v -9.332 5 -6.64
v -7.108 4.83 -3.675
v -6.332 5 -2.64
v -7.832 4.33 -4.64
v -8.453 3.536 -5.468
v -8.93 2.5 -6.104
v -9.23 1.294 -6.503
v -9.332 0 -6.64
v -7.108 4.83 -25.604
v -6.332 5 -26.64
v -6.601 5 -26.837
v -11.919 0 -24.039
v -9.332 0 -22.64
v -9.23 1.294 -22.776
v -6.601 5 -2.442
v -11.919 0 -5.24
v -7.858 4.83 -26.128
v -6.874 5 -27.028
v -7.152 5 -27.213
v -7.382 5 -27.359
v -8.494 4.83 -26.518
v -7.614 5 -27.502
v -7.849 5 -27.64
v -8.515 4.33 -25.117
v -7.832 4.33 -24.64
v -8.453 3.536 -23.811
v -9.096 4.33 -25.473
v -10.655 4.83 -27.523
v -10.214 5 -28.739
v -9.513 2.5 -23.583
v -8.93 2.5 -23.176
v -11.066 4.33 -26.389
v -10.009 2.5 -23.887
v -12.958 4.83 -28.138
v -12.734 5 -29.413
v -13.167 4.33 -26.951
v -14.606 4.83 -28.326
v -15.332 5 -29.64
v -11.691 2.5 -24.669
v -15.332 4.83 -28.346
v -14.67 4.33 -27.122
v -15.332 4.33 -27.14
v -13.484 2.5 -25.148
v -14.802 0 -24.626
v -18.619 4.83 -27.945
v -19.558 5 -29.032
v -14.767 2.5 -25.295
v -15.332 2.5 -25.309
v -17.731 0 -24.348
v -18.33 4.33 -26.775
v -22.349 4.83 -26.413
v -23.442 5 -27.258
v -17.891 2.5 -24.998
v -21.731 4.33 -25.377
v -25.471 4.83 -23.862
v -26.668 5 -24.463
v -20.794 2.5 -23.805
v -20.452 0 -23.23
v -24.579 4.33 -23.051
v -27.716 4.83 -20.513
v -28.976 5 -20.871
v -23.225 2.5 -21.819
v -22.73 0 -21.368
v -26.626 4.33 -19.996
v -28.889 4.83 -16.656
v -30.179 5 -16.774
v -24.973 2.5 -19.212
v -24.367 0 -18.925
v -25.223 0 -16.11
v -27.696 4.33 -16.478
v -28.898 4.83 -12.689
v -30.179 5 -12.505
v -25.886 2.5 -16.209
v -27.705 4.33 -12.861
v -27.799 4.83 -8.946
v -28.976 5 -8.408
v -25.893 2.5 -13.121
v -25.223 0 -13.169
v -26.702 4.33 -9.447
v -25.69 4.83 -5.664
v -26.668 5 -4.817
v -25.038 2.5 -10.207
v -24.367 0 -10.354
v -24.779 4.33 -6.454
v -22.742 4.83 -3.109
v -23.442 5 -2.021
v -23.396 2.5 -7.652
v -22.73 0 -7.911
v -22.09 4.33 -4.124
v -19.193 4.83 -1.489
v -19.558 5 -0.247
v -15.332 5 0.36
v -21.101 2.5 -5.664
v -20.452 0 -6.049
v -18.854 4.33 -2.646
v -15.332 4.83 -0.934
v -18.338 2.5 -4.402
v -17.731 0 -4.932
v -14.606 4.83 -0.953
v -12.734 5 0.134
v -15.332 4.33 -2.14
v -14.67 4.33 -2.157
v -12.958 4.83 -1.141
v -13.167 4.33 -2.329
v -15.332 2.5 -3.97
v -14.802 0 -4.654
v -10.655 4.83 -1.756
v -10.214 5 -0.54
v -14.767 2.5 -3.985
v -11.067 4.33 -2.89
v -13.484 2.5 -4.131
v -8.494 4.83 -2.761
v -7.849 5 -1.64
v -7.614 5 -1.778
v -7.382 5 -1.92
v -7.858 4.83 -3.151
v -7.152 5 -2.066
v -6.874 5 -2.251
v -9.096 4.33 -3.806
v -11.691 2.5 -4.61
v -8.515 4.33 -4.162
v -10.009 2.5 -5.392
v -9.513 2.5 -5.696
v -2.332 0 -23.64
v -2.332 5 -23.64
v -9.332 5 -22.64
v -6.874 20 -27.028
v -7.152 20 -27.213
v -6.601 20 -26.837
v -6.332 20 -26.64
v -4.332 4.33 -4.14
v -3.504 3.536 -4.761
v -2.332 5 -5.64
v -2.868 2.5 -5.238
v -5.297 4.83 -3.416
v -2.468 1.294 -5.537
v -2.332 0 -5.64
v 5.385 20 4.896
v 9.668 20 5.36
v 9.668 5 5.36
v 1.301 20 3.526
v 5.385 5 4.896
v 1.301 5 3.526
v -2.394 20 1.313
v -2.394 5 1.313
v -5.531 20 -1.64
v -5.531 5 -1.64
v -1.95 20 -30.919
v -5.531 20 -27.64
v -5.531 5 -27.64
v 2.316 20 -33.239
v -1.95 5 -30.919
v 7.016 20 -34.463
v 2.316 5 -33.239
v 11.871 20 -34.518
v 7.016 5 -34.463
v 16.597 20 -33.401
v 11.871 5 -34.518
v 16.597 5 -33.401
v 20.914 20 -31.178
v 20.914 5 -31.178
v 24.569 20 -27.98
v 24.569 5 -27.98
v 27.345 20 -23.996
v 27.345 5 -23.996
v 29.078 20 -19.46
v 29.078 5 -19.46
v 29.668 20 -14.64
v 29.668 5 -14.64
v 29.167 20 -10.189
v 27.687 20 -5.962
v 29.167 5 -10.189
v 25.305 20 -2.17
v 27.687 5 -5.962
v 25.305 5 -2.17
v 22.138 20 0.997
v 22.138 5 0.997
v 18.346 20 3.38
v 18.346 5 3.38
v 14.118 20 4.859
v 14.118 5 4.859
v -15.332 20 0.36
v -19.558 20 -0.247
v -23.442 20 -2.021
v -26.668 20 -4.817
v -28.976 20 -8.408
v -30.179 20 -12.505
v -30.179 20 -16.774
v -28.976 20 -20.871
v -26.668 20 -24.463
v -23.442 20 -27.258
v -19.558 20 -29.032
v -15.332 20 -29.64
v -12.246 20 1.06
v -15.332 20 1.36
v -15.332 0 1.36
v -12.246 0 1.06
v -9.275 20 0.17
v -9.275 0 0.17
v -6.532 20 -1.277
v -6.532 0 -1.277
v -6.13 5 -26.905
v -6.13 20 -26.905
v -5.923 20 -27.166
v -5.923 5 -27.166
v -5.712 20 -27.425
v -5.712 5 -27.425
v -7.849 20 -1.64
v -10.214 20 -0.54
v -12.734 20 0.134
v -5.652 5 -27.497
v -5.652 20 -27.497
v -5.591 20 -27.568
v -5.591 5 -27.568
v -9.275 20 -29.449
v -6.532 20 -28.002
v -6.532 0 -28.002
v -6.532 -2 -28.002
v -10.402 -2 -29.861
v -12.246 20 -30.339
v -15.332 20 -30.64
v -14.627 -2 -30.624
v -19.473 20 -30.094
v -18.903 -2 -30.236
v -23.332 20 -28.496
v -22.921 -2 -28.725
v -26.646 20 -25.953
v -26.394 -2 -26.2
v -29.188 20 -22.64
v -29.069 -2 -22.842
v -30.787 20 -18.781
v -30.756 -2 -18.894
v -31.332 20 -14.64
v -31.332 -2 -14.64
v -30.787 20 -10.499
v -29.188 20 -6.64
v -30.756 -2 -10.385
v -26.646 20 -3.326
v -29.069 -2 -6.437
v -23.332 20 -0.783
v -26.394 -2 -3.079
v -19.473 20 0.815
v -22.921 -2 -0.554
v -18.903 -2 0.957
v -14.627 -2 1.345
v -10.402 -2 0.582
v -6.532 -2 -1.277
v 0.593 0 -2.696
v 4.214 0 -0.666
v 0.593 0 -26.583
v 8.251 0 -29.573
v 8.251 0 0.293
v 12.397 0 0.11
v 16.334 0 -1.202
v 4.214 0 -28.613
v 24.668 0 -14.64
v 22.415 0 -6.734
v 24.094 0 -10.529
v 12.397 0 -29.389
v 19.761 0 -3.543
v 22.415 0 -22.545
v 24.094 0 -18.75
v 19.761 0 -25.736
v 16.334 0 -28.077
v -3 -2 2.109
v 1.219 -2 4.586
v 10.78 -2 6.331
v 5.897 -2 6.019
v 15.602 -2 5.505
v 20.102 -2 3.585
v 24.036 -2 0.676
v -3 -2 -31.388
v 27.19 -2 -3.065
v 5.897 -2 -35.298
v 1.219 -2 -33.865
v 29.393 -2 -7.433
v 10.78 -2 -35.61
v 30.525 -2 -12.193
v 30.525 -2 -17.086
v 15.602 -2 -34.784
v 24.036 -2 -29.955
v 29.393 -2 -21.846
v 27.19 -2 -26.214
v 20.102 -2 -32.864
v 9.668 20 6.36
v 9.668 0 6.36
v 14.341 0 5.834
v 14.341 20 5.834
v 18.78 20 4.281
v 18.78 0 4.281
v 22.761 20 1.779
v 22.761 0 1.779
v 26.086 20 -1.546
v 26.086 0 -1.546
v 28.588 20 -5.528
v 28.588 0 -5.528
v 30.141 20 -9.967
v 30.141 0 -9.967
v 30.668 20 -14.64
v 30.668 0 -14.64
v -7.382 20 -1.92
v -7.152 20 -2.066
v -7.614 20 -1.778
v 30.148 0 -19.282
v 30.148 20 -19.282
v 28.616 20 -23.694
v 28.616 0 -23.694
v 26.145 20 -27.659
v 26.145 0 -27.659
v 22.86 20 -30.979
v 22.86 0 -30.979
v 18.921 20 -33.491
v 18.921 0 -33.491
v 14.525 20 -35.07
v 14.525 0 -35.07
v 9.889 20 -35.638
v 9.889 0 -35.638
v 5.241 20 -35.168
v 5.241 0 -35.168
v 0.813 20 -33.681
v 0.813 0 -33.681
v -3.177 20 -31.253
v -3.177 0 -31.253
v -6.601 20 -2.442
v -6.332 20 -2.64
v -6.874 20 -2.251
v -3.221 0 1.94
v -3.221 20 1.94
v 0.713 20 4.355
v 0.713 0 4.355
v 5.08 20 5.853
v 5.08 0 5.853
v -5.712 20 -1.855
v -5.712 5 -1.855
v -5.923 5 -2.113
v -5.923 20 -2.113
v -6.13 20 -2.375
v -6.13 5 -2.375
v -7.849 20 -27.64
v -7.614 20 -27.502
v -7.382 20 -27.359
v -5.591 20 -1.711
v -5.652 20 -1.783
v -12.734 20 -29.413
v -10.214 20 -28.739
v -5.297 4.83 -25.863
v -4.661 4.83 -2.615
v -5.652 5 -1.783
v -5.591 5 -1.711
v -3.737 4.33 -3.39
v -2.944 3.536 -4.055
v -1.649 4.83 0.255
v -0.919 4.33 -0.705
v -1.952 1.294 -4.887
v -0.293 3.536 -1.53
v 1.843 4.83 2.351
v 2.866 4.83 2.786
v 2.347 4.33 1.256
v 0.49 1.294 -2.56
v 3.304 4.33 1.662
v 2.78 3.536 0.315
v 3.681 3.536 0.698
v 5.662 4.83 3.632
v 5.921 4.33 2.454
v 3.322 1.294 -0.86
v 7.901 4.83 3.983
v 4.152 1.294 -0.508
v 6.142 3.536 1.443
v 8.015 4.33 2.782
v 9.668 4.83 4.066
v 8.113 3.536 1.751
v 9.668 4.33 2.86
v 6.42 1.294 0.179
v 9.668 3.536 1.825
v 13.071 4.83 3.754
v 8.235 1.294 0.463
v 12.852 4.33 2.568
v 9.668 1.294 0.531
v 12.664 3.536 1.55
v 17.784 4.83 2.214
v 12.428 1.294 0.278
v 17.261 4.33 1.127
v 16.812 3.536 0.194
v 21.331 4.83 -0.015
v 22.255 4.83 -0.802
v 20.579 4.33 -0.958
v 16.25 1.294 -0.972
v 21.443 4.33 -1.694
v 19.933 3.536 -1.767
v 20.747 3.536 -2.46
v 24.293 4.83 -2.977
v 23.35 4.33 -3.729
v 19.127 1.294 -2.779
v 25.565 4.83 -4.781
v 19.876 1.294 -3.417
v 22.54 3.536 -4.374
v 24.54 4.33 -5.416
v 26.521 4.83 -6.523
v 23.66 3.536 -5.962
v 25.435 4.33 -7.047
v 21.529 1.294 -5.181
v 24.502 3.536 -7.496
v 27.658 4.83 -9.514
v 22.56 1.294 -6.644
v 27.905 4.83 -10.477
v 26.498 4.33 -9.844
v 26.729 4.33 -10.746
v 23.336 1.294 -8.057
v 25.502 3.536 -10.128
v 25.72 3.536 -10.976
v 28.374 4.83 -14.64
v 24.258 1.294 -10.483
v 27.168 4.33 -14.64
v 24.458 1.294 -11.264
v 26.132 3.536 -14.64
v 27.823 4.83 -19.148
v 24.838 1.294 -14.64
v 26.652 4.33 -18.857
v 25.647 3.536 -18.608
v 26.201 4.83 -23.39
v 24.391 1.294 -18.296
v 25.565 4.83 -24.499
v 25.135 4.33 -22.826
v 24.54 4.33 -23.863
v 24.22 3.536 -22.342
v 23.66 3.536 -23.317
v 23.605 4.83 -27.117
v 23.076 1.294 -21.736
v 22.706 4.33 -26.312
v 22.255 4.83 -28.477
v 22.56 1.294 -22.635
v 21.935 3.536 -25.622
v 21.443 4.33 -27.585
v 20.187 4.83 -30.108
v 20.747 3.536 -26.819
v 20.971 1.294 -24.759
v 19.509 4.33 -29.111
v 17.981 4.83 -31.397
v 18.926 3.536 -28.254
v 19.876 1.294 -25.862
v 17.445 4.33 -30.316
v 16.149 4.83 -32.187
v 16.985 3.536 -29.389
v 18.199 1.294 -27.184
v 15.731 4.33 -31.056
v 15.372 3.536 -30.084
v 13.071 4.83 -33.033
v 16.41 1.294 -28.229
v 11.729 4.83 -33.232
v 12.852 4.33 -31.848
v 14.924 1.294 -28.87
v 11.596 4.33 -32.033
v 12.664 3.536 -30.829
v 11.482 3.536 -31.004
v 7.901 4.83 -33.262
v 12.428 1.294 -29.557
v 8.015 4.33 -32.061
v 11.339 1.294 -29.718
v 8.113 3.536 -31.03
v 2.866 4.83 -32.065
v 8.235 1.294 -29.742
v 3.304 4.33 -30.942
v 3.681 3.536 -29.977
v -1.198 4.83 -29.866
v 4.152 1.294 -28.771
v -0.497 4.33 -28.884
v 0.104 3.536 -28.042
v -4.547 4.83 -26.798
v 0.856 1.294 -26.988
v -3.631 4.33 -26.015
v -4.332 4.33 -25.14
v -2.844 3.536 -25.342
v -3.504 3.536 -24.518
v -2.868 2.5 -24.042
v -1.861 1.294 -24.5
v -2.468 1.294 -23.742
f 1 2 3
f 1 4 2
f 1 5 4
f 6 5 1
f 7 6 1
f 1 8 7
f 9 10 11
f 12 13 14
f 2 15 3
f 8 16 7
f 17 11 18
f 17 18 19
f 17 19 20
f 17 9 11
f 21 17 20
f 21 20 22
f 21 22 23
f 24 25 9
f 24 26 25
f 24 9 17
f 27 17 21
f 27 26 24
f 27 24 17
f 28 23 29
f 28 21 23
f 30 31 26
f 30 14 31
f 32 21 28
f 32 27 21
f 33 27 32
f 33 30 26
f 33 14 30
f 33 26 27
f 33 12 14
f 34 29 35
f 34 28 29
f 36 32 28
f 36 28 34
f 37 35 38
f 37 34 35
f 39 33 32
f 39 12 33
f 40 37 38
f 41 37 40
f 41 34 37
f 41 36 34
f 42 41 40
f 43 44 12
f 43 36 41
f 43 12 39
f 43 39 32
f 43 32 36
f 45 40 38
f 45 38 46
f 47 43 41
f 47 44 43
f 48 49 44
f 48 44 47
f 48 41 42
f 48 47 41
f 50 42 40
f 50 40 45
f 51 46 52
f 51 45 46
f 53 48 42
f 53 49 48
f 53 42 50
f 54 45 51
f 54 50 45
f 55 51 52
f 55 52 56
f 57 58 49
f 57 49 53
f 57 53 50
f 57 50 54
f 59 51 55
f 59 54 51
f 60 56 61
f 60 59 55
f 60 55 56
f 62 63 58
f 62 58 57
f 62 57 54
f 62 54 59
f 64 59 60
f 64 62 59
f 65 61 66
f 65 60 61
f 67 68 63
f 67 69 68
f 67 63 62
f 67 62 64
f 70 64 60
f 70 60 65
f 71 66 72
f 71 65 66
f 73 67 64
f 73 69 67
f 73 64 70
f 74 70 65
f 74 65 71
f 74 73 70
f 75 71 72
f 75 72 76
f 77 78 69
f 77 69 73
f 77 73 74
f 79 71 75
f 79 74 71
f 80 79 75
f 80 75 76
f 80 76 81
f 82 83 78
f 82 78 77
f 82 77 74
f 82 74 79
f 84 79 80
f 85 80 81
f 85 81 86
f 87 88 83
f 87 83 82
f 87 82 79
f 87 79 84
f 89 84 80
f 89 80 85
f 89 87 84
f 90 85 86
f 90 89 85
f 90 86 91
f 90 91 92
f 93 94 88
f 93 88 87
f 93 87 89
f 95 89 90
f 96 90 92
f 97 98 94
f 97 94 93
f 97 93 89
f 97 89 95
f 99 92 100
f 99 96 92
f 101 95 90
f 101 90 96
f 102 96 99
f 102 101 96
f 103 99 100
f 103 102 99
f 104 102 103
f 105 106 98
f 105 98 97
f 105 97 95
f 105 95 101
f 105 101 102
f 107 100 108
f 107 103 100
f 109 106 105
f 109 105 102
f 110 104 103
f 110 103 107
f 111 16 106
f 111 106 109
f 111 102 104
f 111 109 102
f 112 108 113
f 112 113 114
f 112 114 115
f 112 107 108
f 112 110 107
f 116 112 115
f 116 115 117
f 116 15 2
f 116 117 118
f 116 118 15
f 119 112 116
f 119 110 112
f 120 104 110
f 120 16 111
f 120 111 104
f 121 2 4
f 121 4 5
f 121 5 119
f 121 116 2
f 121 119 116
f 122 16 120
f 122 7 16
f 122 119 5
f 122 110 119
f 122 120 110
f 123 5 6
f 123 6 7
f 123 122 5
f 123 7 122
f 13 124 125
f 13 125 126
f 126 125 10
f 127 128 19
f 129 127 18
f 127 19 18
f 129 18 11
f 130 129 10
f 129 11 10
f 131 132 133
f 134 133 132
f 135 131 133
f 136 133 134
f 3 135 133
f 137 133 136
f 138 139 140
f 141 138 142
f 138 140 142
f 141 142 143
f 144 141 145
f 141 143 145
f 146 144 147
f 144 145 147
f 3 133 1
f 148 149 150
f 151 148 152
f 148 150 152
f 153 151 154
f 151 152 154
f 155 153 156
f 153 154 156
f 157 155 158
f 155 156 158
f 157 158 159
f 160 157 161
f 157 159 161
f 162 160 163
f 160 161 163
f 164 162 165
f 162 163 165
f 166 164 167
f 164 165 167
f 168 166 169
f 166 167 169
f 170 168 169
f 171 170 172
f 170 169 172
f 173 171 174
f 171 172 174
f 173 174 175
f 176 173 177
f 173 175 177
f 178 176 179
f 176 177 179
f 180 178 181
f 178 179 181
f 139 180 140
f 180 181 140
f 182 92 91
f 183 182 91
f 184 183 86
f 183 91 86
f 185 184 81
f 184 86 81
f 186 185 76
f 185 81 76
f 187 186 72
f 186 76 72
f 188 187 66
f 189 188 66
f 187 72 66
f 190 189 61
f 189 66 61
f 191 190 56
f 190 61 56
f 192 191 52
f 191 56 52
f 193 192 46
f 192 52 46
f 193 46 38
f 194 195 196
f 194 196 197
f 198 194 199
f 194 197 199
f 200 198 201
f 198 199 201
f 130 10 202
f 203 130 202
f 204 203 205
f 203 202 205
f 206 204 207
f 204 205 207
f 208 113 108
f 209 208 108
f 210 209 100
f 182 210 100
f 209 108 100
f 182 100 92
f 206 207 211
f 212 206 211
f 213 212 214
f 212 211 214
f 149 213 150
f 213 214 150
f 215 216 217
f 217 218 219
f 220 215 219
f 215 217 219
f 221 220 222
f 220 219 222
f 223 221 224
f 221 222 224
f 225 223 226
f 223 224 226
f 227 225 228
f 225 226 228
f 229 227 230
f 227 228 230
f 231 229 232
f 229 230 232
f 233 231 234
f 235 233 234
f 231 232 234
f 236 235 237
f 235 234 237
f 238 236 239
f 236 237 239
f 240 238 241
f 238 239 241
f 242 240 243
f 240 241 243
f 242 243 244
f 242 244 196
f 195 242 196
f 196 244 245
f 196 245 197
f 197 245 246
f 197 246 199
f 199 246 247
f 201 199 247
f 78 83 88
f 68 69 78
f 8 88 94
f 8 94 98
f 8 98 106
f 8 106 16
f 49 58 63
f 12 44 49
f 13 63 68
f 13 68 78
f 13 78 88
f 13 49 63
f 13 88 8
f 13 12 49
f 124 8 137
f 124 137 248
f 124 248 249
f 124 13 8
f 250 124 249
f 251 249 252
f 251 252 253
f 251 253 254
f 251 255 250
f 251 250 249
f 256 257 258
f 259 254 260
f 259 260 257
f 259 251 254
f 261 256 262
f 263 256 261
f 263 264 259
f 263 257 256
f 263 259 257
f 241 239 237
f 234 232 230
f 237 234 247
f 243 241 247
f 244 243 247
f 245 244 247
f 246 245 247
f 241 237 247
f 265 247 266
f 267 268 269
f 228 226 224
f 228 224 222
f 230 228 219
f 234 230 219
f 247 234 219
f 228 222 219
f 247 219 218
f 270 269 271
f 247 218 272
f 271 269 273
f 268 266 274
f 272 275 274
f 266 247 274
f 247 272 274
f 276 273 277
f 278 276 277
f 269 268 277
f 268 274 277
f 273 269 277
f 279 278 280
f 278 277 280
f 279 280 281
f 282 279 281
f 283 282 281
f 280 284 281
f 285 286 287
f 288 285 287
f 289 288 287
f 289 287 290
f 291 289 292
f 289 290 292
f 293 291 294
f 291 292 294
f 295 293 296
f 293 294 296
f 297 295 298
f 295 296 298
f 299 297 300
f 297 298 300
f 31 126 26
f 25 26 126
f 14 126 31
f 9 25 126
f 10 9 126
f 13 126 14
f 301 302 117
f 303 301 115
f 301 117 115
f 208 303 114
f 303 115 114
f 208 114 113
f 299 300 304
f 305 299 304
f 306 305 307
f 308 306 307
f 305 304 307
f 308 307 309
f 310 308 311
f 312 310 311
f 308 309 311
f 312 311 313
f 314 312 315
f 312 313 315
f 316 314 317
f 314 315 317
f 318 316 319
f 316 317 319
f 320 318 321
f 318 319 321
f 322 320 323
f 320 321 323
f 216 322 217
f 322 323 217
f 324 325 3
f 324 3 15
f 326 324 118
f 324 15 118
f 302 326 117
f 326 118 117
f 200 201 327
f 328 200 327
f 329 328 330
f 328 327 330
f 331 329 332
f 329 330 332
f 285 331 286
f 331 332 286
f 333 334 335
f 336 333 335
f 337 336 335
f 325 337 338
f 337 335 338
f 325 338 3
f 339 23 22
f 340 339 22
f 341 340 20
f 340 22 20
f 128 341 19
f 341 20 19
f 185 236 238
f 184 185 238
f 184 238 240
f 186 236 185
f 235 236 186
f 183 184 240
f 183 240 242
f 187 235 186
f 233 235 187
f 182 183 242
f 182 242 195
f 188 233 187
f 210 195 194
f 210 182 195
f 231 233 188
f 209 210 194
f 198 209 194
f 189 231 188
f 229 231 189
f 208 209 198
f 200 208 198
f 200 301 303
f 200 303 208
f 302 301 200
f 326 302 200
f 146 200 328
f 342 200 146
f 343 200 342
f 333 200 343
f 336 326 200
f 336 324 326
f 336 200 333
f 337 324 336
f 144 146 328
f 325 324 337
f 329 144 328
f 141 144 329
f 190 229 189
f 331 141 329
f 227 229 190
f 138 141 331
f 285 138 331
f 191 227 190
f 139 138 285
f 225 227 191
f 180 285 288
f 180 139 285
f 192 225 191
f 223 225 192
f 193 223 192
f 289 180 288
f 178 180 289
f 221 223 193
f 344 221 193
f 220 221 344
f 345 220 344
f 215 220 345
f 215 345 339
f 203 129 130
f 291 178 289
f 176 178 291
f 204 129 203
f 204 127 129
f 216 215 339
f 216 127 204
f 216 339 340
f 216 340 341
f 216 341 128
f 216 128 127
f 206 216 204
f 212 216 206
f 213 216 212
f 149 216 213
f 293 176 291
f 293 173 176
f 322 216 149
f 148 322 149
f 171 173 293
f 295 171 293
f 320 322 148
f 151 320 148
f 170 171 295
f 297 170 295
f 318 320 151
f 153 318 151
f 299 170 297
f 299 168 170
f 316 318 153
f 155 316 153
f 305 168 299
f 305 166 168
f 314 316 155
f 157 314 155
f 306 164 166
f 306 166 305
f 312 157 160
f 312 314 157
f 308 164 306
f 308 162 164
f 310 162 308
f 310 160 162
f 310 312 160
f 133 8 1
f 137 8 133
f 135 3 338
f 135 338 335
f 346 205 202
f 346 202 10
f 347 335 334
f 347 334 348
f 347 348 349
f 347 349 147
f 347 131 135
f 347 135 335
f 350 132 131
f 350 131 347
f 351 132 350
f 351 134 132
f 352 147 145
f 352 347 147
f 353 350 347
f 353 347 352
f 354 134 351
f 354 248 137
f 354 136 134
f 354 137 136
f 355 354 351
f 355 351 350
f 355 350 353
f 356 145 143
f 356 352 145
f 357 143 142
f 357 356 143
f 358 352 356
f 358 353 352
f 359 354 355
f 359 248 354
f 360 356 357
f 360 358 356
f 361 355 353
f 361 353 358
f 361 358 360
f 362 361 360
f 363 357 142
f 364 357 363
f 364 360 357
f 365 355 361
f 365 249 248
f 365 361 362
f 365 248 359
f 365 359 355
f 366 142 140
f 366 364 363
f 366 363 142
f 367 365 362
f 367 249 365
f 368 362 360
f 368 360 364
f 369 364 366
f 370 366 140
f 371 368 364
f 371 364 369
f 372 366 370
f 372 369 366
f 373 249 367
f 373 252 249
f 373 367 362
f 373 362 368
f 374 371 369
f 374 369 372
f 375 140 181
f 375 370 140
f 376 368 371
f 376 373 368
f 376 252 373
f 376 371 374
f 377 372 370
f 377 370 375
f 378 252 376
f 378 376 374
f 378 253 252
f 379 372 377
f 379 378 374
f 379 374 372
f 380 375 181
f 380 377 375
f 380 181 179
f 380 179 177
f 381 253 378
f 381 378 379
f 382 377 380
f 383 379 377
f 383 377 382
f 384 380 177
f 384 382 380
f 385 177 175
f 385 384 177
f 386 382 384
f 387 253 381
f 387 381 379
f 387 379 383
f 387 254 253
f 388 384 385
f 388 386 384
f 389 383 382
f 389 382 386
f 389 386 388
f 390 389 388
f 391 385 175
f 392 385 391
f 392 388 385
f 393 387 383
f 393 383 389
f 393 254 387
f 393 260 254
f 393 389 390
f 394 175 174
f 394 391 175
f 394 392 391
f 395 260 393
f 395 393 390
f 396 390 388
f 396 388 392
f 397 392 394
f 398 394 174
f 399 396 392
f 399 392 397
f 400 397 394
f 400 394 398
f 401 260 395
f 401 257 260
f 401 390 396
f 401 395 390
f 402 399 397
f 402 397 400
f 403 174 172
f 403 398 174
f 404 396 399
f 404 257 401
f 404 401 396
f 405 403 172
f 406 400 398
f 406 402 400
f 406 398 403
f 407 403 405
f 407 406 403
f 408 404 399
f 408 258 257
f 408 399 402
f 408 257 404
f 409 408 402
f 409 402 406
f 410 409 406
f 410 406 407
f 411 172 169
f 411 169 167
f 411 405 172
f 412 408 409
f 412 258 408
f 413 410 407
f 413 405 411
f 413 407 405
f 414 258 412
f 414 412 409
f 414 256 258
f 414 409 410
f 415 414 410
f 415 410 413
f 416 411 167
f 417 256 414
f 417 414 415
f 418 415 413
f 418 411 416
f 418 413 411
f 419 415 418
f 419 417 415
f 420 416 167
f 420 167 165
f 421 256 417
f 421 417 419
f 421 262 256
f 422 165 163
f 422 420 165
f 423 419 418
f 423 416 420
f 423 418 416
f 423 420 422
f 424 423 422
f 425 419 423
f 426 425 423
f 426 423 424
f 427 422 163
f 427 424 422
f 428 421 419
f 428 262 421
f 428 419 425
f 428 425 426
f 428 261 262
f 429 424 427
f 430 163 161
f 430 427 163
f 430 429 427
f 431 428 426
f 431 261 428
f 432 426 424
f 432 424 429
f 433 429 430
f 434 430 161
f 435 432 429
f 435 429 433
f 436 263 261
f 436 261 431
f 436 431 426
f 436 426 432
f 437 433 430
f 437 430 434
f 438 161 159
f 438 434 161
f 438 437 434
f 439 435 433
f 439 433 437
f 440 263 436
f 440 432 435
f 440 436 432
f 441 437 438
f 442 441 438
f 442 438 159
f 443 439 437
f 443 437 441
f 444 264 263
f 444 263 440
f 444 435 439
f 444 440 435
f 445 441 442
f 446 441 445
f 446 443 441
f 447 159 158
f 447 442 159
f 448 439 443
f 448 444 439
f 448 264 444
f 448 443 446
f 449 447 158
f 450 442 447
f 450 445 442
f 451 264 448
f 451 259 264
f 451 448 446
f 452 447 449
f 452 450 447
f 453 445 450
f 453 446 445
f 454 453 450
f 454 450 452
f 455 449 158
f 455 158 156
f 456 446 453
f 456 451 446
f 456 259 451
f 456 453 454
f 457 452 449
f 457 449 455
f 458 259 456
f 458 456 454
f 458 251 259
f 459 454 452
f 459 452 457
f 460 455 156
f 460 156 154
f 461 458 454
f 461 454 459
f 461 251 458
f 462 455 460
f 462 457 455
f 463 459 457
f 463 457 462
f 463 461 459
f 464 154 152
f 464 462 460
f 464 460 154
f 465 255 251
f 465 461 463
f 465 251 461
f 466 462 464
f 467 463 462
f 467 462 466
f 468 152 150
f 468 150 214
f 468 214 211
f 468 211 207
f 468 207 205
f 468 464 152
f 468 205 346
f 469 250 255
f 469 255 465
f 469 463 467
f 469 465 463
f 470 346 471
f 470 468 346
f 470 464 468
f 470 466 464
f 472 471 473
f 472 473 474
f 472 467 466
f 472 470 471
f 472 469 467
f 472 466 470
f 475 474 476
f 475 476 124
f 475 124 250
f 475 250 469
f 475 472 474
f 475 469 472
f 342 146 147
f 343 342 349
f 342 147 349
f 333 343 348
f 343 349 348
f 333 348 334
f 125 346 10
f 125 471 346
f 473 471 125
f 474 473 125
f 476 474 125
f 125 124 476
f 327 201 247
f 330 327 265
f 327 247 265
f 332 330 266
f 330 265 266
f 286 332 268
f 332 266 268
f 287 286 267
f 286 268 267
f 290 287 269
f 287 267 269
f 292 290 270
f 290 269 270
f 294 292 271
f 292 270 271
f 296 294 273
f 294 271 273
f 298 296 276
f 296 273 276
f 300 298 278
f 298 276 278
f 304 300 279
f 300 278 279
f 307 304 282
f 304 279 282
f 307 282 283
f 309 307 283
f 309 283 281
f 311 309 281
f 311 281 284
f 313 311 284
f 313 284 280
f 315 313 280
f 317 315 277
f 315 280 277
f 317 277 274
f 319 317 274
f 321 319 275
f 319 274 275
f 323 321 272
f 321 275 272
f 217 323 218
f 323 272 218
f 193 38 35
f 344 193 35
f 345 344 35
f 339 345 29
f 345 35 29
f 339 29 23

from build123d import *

# Parameters (mm, degrees)
EXTRUDE_1_DEPTH = 20
EXTRUDE_START   = -2
SKETCH_1_3_R    = 16
SKETCH_1_3_R_2  = 21
EXTRUDE_2_DEPTH = 2
SWEEP_1_ANGLE   = 286.260205
EXTRUDE_4_DEPTH = 5
EXTRUDE_5_DEPTH = 5


# Read off the part's stored shape, not the designer's step: По траектории1
with BuildPart() as part:
    # Эскиз1 → Бобышка-Вытянуть1 (new body)
    with BuildSketch(Plane(origin=(0, 0, 0), x_dir=(1, 0, 0), z_dir=(0, 1, 0))):
        with BuildLine():
            ThreePointArc((-15.332019477, -0.360375994), (-30.332019477, 14.639624006), (-15.332019477, 29.639624006))
            Line((-15.332019477, 29.639624006), (-15.332019477, 30.639624006))
            ThreePointArc((-15.332019477, 30.639624006), (-31.332019477, 14.639624006), (-15.332019477, -1.360375994))
            Line((-15.332019477, -1.360375994), (-15.332019477, -0.360375994))
        make_face()
        with BuildLine():
            Line((-15.332019477, 30.639624006), (-15.332019477, 29.639624006))
            ThreePointArc((-15.332019477, 29.639624006), (-11.459036131, 29.131000752), (-7.848704703, 27.639624006))
            Line((-7.848704703, 27.639624006), (-6.824441979, 27.639624006))
            ThreePointArc((-6.824441979, 27.639624006), (-6.679236311, 27.821752127), (-6.532019477, 28.002258477))
            ThreePointArc((-6.532019477, 28.002258477), (-10.738662944, 29.96610683), (-15.332019477, 30.639624006))
        make_face()
        with BuildLine():
            ThreePointArc((-7.848704703, 1.639624006), (-11.459036131, 0.14824726), (-15.332019477, -0.360375994))
            Line((-15.332019477, -0.360375994), (-15.332019477, -1.360375994))
            ThreePointArc((-15.332019477, -1.360375994), (-10.738662944, -0.686858818), (-6.532019477, 1.276989535))
            ThreePointArc((-6.532019477, 1.276989535), (-6.679236311, 1.457495885), (-6.824441979, 1.639624006))
            Line((-6.824441979, 1.639624006), (-7.848704703, 1.639624006))
        make_face()
        with BuildLine():
            ThreePointArc((-6.004640424, 1.639624006), (-6.266516525, 1.455669507), (-6.532019477, 1.276989535))
            ThreePointArc((-6.532019477, 1.276989535), (0.712963044, -4.355313792), (9.667980523, -6.360375994))
            Line((9.667980523, -6.360375994), (9.667980523, -5.360375994))
            ThreePointArc((9.667980523, -5.360375994), (1.301380258, -3.526278119), (-5.53070363, 1.639624006))
            Line((-5.53070363, 1.639624006), (-6.004640424, 1.639624006))
        make_face()
        with BuildLine():
            ThreePointArc((30.667980523, 14.639624006), (16.767276263, 34.403226916), (-6.532019477, 28.002258477))
            ThreePointArc((-6.532019477, 28.002258477), (-6.266516525, 27.823578505), (-6.004640424, 27.639624006))
            Line((-6.004640424, 27.639624006), (-5.53070363, 27.639624006))
            ThreePointArc((-5.53070363, 27.639624006), (16.597133319, 33.400936368), (29.667980523, 14.639624006))
            ThreePointArc((29.667980523, 14.639624006), (23.810116147, 0.497488382), (9.667980523, -5.360375994))
            Line((9.667980523, -5.360375994), (9.667980523, -6.360375994))
            ThreePointArc((9.667980523, -6.360375994), (24.517222928, -0.209618399), (30.667980523, 14.639624006))
        make_face()
        with BuildLine():
            ThreePointArc((-6.532019477, 28.002258477), (-6.679236311, 27.821752127), (-6.824441979, 27.639624006))
            Line((-6.824441979, 27.639624006), (-6.004640424, 27.639624006))
            ThreePointArc((-6.004640424, 27.639624006), (-6.266516525, 27.823578505), (-6.532019477, 28.002258477))
        make_face()
        with BuildLine():
            Line((-6.824441979, 27.639624006), (-7.848704703, 27.639624006))
            ThreePointArc((-7.848704703, 27.639624006), (-7.497456441, 27.431012595), (-7.152019477, 27.212913154))
            ThreePointArc((-7.152019477, 27.212913154), (-6.989597145, 27.427317552), (-6.824441979, 27.639624006))
        make_face()
        with BuildLine():
            ThreePointArc((-6.824441979, 27.639624006), (-6.989597145, 27.427317552), (-7.152019477, 27.212913154))
            ThreePointArc((-7.152019477, 27.212913154), (-6.737238205, 26.933107438), (-6.332019477, 26.639624006))
            ThreePointArc((-6.332019477, 26.639624006), (-6.02692778, 27.035988527), (-5.712019477, 27.424599563))
            ThreePointArc((-5.712019477, 27.424599563), (-5.857719918, 27.532941961), (-6.004640424, 27.639624006))
            Line((-6.004640424, 27.639624006), (-6.824441979, 27.639624006))
        make_face()
        with BuildLine():
            Line((-5.53070363, 27.639624006), (-6.004640424, 27.639624006))
            ThreePointArc((-6.004640424, 27.639624006), (-5.857719918, 27.532941961), (-5.712019477, 27.424599563))
            ThreePointArc((-5.712019477, 27.424599563), (-5.621739553, 27.532430527), (-5.53070363, 27.639624006))
        make_face()
        with BuildLine():
            ThreePointArc((-6.332019477, 2.639624006), (-6.737238205, 2.346140574), (-7.152019477, 2.066334858))
            ThreePointArc((-7.152019477, 2.066334858), (-6.989597145, 1.85193046), (-6.824441979, 1.639624006))
            Line((-6.824441979, 1.639624006), (-6.004640424, 1.639624006))
            ThreePointArc((-6.004640424, 1.639624006), (-5.857719918, 1.746306051), (-5.712019477, 1.854648449))
            ThreePointArc((-5.712019477, 1.854648449), (-6.02692778, 2.243259485), (-6.332019477, 2.639624006))
        make_face()
        with BuildLine():
            ThreePointArc((-7.152019477, 2.066334858), (-7.497456441, 1.848235417), (-7.848704703, 1.639624006))
            Line((-7.848704703, 1.639624006), (-6.824441979, 1.639624006))
            ThreePointArc((-6.824441979, 1.639624006), (-6.989597145, 1.85193046), (-7.152019477, 2.066334858))
        make_face()
        with BuildLine():
            Line((-6.004640424, 1.639624006), (-6.824441979, 1.639624006))
            ThreePointArc((-6.824441979, 1.639624006), (-6.679236311, 1.457495885), (-6.532019477, 1.276989535))
            ThreePointArc((-6.532019477, 1.276989535), (-6.266516525, 1.455669507), (-6.004640424, 1.639624006))
        make_face()
        with BuildLine():
            ThreePointArc((-5.712019477, 1.854648449), (-5.857719918, 1.746306051), (-6.004640424, 1.639624006))
            Line((-6.004640424, 1.639624006), (-5.53070363, 1.639624006))
            ThreePointArc((-5.53070363, 1.639624006), (-5.621739553, 1.746817485), (-5.712019477, 1.854648449))
        make_face()
    extrude(amount=EXTRUDE_1_DEPTH)

    # Эскиз1<3> → Бобышка-Вытянуть2 (add)
    with BuildSketch(Plane(origin=(0, 0, 0), x_dir=(1, 0, 0), z_dir=(0, 1, 0)).offset(EXTRUDE_START)):
        with Locations((-15.332019477, 14.639624006)):
            Circle(SKETCH_1_3_R)
        with Locations((9.667980523, 14.639624006)):
            Circle(SKETCH_1_3_R_2)
    extrude(amount=EXTRUDE_2_DEPTH)

    # По траектории1 outline → По траектории1 (revolve)
    with BuildSketch(Plane(origin=(9.667980523, 0, -14.639624006), x_dir=(-0.7999999999999995, 0, 0.6000000000000008), z_dir=(-0.6000000000000008, 0, -0.7999999999999995))):
        with BuildLine():
            ThreePointArc((20, 5), (16.464466094, 3.535533906), (15, 0))
            Line((15, 0), (20, 0))
            Line((20, 0), (20, 5))
        make_face()
    revolve(axis=Axis((9.667980523, 0, -14.639624006), (0, 1, 0)), revolution_arc=SWEEP_1_ANGLE)

    # По траектории9: sweep along a curve in space
    with BuildLine() as sweep_9_path:
        ThreePointArc((-6.332019477, 0, -26.639624006), (-30.332019477, 0, -14.639624006), (-6.332019477, 0, -2.639624006))
    # Sketch 5 → По траектории9 (sweep)
    with BuildSketch(Plane(origin=(-30.332019477, 0, -14.639624006), x_dir=(1, 0, 0), z_dir=(0, 0, 1))):
        with BuildLine():
            Line((0, 0), (5, 0))
            ThreePointArc((5, 0), (3.535533906, 3.535533906), (0, 5))
            Line((0, 5), (0, 0))
        make_face()
    sweep(path=sweep_9_path.line)

    # Эскиз17 → Бобышка-Вытянуть4 (add)
    with BuildSketch(Plane(origin=(0, 0, 0), x_dir=(1, 0, 0), z_dir=(0, 1, 0))):
        Polygon((-9.332019477, 6.639624006), (-2.332019477, 5.639624006), (-6.332019477, 2.639624006), align=None)
    extrude(amount=EXTRUDE_4_DEPTH)

    # Эскиз19 → Бобышка-Вытянуть5 (add)
    with BuildSketch(Plane(origin=(0, 0, 0), x_dir=(1, 0, 0), z_dir=(0, 1, 0))):
        Polygon((-2.332019477, 23.639624006), (-9.332019477, 22.639624006), (-6.332019477, 26.639624006), align=None)
    extrude(amount=EXTRUDE_5_DEPTH)


solid = part.part
